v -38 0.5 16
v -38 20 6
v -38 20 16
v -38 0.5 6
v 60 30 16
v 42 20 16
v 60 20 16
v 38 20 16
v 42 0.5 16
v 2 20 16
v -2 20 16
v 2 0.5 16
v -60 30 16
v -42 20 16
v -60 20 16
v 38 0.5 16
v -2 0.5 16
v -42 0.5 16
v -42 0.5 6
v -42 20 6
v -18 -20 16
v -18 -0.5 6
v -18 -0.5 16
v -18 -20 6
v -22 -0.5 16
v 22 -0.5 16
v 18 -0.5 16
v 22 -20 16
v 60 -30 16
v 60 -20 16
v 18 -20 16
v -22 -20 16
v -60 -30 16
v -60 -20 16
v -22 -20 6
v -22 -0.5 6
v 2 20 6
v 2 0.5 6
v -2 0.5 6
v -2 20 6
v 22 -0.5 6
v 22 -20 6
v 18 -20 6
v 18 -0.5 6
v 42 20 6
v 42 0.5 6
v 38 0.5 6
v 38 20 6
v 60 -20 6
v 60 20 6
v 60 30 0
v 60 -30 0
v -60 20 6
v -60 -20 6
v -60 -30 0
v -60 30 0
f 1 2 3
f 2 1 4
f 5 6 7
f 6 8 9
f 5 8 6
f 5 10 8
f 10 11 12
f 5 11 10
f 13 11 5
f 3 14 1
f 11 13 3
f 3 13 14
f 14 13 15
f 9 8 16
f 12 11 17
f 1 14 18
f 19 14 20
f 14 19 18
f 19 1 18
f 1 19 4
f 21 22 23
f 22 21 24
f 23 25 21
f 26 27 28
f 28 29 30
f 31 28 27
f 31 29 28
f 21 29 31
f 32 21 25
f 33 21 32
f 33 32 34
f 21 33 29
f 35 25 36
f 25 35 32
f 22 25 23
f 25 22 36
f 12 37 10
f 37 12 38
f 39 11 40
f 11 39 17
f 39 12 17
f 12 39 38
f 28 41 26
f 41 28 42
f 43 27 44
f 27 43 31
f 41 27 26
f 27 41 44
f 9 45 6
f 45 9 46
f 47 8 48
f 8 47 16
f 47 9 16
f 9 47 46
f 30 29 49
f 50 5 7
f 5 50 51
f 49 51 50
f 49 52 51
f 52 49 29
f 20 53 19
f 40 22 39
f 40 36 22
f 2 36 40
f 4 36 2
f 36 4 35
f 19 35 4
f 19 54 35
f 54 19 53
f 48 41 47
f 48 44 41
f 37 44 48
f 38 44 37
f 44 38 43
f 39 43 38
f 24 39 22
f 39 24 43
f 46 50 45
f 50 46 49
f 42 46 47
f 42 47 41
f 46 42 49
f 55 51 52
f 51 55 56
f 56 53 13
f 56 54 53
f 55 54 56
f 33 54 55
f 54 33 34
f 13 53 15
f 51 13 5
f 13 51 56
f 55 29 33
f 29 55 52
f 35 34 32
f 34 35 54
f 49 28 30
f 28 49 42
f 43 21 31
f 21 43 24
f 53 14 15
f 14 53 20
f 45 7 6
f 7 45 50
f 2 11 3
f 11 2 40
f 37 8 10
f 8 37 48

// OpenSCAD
$fn = 32;

// ----------------------------------------------------------------------
// Rib frame 120 x 60 x 16
// 5 ribs at 20 mm pitch, staggered
// ----------------------------------------------------------------------

// --- parameters (mm) ---
frame = [120, 60, 6];  // base plate size (x, y, z)
rail_w = 10;           // side rail width
ribs = 5;              // number of ribs
rib_t = 4;             // rib thickness
rib_h = 10;            // rib height above the base plate
pitch = 20;            // pitch between rib centres

// --- derived feature positions (mm) ---
span = (ribs - 1) * pitch;          // = 80   distance between the outer ribs
origin_x = -span / 2;               // = -40   X of the first rib
rib_len = frame[1] / 2 - rail_w + 0.5;  // = 20.5   length of a staggered rib
rib_y = 0.5 + rib_len / 2;          // = 10.75   Y of a staggered rib centre
row_offset = 2 * rib_y;             // = 21.5   distance between the two rows
feature_centers = [
  [origin_x + 0 * pitch, rib_y],
  [origin_x + 1 * pitch, -rib_y],
  [origin_x + 2 * pitch, rib_y],
  [origin_x + 3 * pitch, -rib_y],
  [origin_x + 4 * pitch, rib_y]
];   // rib centre line, drives the rib loop

// base plate, two side rails, then the ribs read straight off feature_centers
union() {
  translate([-frame[0] / 2, -frame[1] / 2, 0]) cube(frame);
  translate([-frame[0] / 2, -frame[1] / 2, 0]) cube([frame[0], rail_w, frame[2] + rib_h]);
  translate([-frame[0] / 2, frame[1] / 2 - rail_w, 0]) cube([frame[0], rail_w, frame[2] + rib_h]);
  for (centre = feature_centers)
    translate([centre[0] - rib_t / 2, centre[1] - rib_len / 2, frame[2] - 1])
      cube([rib_t, rib_len, rib_h + 1]);
}
